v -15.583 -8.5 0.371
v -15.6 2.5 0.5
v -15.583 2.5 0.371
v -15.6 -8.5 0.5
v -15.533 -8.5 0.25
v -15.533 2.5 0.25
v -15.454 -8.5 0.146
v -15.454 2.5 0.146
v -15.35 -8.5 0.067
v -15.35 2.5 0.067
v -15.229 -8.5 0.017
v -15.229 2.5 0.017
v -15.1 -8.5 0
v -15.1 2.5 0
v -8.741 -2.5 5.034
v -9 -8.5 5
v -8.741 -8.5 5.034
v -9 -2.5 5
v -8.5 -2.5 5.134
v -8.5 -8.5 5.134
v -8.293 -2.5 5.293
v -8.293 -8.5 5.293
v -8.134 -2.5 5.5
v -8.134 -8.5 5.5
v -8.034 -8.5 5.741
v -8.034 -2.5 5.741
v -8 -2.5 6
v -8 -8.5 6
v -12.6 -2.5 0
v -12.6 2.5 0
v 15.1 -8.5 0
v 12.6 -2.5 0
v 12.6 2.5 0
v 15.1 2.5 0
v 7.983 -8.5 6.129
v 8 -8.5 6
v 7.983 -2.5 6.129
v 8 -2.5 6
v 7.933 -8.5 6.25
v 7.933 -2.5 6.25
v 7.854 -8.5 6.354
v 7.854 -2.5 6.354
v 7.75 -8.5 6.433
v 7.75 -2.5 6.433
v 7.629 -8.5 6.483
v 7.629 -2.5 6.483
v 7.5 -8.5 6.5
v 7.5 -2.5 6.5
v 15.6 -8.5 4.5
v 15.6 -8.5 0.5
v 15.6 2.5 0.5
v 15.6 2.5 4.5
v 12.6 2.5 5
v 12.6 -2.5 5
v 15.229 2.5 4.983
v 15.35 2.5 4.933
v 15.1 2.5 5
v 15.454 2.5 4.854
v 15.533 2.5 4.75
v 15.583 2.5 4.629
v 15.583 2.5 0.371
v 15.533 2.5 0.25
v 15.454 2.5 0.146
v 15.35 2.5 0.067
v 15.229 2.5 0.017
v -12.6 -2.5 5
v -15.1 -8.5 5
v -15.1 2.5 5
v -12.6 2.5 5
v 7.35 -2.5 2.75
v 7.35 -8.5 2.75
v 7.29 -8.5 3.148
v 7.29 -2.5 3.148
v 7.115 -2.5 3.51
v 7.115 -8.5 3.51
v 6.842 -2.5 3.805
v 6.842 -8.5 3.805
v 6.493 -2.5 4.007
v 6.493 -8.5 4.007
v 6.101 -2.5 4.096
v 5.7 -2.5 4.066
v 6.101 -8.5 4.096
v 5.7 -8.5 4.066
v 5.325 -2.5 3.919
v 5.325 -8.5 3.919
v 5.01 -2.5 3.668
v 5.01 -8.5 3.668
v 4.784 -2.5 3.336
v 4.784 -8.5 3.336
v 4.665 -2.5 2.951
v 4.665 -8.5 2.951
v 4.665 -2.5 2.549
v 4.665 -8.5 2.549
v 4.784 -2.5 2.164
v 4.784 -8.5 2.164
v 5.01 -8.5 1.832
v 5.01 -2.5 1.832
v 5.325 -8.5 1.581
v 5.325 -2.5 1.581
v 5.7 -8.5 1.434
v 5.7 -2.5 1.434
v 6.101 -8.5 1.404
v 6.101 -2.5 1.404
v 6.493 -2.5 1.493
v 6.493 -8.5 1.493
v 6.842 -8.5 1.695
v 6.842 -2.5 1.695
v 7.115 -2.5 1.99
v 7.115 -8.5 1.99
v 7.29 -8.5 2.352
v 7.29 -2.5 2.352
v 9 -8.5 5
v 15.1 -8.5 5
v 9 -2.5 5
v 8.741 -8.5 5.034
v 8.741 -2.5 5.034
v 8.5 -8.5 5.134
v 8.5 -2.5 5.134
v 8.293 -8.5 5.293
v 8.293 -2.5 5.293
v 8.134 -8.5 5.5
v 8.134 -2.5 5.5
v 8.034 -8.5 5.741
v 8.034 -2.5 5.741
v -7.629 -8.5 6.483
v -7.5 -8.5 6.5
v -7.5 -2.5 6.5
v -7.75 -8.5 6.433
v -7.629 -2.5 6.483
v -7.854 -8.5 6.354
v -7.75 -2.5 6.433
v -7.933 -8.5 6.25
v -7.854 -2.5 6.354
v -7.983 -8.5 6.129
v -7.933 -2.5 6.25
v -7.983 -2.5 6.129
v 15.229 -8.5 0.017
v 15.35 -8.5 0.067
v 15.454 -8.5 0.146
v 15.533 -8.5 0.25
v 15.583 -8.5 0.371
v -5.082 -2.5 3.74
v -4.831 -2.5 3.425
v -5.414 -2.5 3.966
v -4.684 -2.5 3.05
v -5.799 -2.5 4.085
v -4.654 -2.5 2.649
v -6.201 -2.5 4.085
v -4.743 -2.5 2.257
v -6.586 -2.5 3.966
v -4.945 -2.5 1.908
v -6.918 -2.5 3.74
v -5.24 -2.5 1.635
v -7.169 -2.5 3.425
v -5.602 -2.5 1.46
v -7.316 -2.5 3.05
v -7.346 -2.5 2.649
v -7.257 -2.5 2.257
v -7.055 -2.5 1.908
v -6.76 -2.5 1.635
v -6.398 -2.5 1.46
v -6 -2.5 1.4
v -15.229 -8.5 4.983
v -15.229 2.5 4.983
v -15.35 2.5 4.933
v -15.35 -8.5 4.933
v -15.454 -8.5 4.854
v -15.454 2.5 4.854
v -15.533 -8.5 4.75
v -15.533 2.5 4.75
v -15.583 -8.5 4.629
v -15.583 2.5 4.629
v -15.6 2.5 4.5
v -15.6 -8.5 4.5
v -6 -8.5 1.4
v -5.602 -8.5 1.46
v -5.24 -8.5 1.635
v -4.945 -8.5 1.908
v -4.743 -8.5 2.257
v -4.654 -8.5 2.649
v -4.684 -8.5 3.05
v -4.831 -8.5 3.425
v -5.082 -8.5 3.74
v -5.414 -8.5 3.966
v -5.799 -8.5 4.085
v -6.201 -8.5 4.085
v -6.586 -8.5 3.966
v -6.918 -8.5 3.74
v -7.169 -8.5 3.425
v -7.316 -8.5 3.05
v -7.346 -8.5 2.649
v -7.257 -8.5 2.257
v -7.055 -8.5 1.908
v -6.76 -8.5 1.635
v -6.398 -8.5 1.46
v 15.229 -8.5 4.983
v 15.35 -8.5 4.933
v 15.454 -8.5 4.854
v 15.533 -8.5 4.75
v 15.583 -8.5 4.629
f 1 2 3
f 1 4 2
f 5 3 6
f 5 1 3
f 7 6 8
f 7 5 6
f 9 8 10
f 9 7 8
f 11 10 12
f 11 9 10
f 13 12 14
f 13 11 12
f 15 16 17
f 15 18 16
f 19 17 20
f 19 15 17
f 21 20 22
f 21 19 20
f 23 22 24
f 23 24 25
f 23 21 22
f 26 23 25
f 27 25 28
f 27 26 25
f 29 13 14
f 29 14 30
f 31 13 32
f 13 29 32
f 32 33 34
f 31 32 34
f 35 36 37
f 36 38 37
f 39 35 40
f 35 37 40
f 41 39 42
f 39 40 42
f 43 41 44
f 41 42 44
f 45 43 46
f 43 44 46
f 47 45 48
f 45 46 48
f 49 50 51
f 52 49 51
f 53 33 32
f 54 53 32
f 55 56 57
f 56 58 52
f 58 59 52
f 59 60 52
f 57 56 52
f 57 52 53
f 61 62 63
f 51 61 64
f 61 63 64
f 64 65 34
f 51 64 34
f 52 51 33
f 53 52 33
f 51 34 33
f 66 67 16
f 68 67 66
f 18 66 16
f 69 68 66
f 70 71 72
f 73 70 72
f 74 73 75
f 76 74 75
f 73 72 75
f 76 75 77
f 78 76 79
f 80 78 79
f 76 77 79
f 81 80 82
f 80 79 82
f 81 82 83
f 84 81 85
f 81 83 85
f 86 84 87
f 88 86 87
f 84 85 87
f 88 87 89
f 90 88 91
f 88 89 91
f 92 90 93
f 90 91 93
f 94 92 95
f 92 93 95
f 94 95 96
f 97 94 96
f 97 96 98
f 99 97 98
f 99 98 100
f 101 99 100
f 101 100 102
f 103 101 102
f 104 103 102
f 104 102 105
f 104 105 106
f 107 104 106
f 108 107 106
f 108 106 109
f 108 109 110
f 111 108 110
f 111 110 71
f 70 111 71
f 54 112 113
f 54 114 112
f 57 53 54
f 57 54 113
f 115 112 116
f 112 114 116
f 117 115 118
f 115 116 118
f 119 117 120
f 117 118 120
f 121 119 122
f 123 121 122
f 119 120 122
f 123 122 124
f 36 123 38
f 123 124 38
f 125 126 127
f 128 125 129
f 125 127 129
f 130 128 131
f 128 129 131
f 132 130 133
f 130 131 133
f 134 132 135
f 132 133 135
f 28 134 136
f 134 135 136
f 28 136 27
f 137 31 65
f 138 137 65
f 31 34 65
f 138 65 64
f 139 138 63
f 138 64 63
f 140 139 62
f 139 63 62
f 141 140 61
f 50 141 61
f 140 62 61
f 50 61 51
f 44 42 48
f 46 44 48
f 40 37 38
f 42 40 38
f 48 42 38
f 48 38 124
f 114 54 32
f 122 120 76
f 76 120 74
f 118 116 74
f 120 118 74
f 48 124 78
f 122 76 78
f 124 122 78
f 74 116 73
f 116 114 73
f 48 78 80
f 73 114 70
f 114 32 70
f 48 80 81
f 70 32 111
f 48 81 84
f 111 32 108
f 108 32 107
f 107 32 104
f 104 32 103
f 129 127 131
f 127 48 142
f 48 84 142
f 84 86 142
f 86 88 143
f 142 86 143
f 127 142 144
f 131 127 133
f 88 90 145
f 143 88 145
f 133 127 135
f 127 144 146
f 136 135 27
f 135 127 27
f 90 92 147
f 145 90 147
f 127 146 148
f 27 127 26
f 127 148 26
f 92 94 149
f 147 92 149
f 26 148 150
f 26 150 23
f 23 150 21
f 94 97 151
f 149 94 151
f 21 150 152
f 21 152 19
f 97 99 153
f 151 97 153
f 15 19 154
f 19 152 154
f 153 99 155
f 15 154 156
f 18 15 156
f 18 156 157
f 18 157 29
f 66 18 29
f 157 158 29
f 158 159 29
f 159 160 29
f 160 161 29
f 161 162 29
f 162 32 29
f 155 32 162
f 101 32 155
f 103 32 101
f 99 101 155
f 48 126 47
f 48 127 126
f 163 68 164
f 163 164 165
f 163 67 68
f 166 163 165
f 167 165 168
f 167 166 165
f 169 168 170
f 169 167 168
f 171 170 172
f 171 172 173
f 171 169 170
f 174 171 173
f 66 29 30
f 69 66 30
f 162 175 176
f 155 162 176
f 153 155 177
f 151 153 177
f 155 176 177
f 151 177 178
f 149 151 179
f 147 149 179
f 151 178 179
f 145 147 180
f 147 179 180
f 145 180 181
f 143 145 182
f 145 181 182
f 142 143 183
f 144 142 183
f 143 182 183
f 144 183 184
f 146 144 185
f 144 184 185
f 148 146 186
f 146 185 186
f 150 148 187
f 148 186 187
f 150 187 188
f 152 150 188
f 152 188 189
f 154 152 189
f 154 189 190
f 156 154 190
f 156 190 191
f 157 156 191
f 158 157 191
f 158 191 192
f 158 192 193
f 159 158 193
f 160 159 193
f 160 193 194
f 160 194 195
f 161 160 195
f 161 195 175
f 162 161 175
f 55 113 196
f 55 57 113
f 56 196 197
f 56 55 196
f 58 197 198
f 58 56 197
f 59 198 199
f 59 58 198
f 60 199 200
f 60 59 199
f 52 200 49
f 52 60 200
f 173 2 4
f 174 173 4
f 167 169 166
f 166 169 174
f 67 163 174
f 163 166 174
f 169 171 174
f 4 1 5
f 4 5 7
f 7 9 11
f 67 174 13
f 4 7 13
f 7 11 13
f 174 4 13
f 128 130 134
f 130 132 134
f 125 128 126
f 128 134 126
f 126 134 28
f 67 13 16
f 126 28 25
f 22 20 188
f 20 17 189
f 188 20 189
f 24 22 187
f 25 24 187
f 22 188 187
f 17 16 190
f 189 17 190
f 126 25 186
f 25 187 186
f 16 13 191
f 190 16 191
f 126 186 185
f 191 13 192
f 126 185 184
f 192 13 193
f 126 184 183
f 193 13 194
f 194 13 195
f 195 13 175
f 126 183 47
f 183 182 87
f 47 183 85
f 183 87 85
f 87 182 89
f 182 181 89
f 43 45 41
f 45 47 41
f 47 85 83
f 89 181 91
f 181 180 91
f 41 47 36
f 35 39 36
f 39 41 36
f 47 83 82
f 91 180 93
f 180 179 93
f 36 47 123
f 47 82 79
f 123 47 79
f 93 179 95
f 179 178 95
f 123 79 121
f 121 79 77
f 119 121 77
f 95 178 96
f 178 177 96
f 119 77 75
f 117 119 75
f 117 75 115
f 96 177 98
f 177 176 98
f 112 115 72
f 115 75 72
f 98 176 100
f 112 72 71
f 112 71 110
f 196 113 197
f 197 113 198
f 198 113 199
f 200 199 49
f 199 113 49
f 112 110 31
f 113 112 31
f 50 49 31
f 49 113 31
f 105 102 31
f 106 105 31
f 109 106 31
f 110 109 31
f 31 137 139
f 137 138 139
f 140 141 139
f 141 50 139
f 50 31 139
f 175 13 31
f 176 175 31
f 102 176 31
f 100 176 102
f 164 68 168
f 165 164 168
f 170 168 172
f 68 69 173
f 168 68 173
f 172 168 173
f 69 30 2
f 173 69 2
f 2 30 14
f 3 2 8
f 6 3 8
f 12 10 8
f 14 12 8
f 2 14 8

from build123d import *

# Parameters (mm, degrees)
EXTRUDE_1_DEPTH     = 5
SKETCH_2_W          = 16
SKETCH_2_H          = 6
EXTRUDE_2_DEPTH     = 1.5
SKETCH_3_R          = 1.35
CUT_EXTRUDE_1_DEPTH = 21.164572894
FILLET_1_R          = 1
FILLET_2_R          = 0.5


with BuildPart() as part:
    # 草图1 → 凸台-拉伸1 (new body)
    with BuildSketch(Plane.XY):
        Polygon((-12.6, 2.5), (-15.6, 2.5), (-15.6, -8.5), (15.6, -8.5), (15.6, 2.5), (12.6, 2.5), (12.6, -2.5), (-12.6, -2.5), align=None)
    extrude(amount=EXTRUDE_1_DEPTH)

    # 草图2 → 凸台-拉伸2 (add)
    with BuildSketch(Plane.XY.offset(5)):
        with Locations((0, -5.5)):
            Rectangle(SKETCH_2_W, SKETCH_2_H)
    extrude(amount=EXTRUDE_2_DEPTH)

    # 草图3 → 切除-拉伸1 (cut, through all)
    with BuildSketch(Plane.XZ.offset(8.5)):
        with Locations(Location((-6, 2.75, 0), (0, 0, 270))):
            Circle(SKETCH_3_R)
        with Locations((6, 2.75)):
            Circle(SKETCH_3_R)
    extrude(amount=-CUT_EXTRUDE_1_DEPTH, mode=Mode.SUBTRACT)

    # 圆角1
    fillet_1_edges = [part.edges().sort_by_distance(p)[0] for p in [
        (-8, -5.5, 5),
        (8, -5.5, 5),
    ]]
    fillet(fillet_1_edges, radius=FILLET_1_R)

    # 圆角2
    fillet_2_edges = [part.edges().sort_by_distance(p)[0] for p in [
        (15.6, -3, 0),
        (15.6, -3, 5),
        (8, -5.5, 6.5),
        (-8, -5.5, 6.5),
        (-15.6, -3, 5),
        (-15.6, -3, 0),
    ]]
    fillet(fillet_2_edges, radius=FILLET_2_R - 0.0001)  # a hair under: the kernel refuses the full size


solid = part.part
